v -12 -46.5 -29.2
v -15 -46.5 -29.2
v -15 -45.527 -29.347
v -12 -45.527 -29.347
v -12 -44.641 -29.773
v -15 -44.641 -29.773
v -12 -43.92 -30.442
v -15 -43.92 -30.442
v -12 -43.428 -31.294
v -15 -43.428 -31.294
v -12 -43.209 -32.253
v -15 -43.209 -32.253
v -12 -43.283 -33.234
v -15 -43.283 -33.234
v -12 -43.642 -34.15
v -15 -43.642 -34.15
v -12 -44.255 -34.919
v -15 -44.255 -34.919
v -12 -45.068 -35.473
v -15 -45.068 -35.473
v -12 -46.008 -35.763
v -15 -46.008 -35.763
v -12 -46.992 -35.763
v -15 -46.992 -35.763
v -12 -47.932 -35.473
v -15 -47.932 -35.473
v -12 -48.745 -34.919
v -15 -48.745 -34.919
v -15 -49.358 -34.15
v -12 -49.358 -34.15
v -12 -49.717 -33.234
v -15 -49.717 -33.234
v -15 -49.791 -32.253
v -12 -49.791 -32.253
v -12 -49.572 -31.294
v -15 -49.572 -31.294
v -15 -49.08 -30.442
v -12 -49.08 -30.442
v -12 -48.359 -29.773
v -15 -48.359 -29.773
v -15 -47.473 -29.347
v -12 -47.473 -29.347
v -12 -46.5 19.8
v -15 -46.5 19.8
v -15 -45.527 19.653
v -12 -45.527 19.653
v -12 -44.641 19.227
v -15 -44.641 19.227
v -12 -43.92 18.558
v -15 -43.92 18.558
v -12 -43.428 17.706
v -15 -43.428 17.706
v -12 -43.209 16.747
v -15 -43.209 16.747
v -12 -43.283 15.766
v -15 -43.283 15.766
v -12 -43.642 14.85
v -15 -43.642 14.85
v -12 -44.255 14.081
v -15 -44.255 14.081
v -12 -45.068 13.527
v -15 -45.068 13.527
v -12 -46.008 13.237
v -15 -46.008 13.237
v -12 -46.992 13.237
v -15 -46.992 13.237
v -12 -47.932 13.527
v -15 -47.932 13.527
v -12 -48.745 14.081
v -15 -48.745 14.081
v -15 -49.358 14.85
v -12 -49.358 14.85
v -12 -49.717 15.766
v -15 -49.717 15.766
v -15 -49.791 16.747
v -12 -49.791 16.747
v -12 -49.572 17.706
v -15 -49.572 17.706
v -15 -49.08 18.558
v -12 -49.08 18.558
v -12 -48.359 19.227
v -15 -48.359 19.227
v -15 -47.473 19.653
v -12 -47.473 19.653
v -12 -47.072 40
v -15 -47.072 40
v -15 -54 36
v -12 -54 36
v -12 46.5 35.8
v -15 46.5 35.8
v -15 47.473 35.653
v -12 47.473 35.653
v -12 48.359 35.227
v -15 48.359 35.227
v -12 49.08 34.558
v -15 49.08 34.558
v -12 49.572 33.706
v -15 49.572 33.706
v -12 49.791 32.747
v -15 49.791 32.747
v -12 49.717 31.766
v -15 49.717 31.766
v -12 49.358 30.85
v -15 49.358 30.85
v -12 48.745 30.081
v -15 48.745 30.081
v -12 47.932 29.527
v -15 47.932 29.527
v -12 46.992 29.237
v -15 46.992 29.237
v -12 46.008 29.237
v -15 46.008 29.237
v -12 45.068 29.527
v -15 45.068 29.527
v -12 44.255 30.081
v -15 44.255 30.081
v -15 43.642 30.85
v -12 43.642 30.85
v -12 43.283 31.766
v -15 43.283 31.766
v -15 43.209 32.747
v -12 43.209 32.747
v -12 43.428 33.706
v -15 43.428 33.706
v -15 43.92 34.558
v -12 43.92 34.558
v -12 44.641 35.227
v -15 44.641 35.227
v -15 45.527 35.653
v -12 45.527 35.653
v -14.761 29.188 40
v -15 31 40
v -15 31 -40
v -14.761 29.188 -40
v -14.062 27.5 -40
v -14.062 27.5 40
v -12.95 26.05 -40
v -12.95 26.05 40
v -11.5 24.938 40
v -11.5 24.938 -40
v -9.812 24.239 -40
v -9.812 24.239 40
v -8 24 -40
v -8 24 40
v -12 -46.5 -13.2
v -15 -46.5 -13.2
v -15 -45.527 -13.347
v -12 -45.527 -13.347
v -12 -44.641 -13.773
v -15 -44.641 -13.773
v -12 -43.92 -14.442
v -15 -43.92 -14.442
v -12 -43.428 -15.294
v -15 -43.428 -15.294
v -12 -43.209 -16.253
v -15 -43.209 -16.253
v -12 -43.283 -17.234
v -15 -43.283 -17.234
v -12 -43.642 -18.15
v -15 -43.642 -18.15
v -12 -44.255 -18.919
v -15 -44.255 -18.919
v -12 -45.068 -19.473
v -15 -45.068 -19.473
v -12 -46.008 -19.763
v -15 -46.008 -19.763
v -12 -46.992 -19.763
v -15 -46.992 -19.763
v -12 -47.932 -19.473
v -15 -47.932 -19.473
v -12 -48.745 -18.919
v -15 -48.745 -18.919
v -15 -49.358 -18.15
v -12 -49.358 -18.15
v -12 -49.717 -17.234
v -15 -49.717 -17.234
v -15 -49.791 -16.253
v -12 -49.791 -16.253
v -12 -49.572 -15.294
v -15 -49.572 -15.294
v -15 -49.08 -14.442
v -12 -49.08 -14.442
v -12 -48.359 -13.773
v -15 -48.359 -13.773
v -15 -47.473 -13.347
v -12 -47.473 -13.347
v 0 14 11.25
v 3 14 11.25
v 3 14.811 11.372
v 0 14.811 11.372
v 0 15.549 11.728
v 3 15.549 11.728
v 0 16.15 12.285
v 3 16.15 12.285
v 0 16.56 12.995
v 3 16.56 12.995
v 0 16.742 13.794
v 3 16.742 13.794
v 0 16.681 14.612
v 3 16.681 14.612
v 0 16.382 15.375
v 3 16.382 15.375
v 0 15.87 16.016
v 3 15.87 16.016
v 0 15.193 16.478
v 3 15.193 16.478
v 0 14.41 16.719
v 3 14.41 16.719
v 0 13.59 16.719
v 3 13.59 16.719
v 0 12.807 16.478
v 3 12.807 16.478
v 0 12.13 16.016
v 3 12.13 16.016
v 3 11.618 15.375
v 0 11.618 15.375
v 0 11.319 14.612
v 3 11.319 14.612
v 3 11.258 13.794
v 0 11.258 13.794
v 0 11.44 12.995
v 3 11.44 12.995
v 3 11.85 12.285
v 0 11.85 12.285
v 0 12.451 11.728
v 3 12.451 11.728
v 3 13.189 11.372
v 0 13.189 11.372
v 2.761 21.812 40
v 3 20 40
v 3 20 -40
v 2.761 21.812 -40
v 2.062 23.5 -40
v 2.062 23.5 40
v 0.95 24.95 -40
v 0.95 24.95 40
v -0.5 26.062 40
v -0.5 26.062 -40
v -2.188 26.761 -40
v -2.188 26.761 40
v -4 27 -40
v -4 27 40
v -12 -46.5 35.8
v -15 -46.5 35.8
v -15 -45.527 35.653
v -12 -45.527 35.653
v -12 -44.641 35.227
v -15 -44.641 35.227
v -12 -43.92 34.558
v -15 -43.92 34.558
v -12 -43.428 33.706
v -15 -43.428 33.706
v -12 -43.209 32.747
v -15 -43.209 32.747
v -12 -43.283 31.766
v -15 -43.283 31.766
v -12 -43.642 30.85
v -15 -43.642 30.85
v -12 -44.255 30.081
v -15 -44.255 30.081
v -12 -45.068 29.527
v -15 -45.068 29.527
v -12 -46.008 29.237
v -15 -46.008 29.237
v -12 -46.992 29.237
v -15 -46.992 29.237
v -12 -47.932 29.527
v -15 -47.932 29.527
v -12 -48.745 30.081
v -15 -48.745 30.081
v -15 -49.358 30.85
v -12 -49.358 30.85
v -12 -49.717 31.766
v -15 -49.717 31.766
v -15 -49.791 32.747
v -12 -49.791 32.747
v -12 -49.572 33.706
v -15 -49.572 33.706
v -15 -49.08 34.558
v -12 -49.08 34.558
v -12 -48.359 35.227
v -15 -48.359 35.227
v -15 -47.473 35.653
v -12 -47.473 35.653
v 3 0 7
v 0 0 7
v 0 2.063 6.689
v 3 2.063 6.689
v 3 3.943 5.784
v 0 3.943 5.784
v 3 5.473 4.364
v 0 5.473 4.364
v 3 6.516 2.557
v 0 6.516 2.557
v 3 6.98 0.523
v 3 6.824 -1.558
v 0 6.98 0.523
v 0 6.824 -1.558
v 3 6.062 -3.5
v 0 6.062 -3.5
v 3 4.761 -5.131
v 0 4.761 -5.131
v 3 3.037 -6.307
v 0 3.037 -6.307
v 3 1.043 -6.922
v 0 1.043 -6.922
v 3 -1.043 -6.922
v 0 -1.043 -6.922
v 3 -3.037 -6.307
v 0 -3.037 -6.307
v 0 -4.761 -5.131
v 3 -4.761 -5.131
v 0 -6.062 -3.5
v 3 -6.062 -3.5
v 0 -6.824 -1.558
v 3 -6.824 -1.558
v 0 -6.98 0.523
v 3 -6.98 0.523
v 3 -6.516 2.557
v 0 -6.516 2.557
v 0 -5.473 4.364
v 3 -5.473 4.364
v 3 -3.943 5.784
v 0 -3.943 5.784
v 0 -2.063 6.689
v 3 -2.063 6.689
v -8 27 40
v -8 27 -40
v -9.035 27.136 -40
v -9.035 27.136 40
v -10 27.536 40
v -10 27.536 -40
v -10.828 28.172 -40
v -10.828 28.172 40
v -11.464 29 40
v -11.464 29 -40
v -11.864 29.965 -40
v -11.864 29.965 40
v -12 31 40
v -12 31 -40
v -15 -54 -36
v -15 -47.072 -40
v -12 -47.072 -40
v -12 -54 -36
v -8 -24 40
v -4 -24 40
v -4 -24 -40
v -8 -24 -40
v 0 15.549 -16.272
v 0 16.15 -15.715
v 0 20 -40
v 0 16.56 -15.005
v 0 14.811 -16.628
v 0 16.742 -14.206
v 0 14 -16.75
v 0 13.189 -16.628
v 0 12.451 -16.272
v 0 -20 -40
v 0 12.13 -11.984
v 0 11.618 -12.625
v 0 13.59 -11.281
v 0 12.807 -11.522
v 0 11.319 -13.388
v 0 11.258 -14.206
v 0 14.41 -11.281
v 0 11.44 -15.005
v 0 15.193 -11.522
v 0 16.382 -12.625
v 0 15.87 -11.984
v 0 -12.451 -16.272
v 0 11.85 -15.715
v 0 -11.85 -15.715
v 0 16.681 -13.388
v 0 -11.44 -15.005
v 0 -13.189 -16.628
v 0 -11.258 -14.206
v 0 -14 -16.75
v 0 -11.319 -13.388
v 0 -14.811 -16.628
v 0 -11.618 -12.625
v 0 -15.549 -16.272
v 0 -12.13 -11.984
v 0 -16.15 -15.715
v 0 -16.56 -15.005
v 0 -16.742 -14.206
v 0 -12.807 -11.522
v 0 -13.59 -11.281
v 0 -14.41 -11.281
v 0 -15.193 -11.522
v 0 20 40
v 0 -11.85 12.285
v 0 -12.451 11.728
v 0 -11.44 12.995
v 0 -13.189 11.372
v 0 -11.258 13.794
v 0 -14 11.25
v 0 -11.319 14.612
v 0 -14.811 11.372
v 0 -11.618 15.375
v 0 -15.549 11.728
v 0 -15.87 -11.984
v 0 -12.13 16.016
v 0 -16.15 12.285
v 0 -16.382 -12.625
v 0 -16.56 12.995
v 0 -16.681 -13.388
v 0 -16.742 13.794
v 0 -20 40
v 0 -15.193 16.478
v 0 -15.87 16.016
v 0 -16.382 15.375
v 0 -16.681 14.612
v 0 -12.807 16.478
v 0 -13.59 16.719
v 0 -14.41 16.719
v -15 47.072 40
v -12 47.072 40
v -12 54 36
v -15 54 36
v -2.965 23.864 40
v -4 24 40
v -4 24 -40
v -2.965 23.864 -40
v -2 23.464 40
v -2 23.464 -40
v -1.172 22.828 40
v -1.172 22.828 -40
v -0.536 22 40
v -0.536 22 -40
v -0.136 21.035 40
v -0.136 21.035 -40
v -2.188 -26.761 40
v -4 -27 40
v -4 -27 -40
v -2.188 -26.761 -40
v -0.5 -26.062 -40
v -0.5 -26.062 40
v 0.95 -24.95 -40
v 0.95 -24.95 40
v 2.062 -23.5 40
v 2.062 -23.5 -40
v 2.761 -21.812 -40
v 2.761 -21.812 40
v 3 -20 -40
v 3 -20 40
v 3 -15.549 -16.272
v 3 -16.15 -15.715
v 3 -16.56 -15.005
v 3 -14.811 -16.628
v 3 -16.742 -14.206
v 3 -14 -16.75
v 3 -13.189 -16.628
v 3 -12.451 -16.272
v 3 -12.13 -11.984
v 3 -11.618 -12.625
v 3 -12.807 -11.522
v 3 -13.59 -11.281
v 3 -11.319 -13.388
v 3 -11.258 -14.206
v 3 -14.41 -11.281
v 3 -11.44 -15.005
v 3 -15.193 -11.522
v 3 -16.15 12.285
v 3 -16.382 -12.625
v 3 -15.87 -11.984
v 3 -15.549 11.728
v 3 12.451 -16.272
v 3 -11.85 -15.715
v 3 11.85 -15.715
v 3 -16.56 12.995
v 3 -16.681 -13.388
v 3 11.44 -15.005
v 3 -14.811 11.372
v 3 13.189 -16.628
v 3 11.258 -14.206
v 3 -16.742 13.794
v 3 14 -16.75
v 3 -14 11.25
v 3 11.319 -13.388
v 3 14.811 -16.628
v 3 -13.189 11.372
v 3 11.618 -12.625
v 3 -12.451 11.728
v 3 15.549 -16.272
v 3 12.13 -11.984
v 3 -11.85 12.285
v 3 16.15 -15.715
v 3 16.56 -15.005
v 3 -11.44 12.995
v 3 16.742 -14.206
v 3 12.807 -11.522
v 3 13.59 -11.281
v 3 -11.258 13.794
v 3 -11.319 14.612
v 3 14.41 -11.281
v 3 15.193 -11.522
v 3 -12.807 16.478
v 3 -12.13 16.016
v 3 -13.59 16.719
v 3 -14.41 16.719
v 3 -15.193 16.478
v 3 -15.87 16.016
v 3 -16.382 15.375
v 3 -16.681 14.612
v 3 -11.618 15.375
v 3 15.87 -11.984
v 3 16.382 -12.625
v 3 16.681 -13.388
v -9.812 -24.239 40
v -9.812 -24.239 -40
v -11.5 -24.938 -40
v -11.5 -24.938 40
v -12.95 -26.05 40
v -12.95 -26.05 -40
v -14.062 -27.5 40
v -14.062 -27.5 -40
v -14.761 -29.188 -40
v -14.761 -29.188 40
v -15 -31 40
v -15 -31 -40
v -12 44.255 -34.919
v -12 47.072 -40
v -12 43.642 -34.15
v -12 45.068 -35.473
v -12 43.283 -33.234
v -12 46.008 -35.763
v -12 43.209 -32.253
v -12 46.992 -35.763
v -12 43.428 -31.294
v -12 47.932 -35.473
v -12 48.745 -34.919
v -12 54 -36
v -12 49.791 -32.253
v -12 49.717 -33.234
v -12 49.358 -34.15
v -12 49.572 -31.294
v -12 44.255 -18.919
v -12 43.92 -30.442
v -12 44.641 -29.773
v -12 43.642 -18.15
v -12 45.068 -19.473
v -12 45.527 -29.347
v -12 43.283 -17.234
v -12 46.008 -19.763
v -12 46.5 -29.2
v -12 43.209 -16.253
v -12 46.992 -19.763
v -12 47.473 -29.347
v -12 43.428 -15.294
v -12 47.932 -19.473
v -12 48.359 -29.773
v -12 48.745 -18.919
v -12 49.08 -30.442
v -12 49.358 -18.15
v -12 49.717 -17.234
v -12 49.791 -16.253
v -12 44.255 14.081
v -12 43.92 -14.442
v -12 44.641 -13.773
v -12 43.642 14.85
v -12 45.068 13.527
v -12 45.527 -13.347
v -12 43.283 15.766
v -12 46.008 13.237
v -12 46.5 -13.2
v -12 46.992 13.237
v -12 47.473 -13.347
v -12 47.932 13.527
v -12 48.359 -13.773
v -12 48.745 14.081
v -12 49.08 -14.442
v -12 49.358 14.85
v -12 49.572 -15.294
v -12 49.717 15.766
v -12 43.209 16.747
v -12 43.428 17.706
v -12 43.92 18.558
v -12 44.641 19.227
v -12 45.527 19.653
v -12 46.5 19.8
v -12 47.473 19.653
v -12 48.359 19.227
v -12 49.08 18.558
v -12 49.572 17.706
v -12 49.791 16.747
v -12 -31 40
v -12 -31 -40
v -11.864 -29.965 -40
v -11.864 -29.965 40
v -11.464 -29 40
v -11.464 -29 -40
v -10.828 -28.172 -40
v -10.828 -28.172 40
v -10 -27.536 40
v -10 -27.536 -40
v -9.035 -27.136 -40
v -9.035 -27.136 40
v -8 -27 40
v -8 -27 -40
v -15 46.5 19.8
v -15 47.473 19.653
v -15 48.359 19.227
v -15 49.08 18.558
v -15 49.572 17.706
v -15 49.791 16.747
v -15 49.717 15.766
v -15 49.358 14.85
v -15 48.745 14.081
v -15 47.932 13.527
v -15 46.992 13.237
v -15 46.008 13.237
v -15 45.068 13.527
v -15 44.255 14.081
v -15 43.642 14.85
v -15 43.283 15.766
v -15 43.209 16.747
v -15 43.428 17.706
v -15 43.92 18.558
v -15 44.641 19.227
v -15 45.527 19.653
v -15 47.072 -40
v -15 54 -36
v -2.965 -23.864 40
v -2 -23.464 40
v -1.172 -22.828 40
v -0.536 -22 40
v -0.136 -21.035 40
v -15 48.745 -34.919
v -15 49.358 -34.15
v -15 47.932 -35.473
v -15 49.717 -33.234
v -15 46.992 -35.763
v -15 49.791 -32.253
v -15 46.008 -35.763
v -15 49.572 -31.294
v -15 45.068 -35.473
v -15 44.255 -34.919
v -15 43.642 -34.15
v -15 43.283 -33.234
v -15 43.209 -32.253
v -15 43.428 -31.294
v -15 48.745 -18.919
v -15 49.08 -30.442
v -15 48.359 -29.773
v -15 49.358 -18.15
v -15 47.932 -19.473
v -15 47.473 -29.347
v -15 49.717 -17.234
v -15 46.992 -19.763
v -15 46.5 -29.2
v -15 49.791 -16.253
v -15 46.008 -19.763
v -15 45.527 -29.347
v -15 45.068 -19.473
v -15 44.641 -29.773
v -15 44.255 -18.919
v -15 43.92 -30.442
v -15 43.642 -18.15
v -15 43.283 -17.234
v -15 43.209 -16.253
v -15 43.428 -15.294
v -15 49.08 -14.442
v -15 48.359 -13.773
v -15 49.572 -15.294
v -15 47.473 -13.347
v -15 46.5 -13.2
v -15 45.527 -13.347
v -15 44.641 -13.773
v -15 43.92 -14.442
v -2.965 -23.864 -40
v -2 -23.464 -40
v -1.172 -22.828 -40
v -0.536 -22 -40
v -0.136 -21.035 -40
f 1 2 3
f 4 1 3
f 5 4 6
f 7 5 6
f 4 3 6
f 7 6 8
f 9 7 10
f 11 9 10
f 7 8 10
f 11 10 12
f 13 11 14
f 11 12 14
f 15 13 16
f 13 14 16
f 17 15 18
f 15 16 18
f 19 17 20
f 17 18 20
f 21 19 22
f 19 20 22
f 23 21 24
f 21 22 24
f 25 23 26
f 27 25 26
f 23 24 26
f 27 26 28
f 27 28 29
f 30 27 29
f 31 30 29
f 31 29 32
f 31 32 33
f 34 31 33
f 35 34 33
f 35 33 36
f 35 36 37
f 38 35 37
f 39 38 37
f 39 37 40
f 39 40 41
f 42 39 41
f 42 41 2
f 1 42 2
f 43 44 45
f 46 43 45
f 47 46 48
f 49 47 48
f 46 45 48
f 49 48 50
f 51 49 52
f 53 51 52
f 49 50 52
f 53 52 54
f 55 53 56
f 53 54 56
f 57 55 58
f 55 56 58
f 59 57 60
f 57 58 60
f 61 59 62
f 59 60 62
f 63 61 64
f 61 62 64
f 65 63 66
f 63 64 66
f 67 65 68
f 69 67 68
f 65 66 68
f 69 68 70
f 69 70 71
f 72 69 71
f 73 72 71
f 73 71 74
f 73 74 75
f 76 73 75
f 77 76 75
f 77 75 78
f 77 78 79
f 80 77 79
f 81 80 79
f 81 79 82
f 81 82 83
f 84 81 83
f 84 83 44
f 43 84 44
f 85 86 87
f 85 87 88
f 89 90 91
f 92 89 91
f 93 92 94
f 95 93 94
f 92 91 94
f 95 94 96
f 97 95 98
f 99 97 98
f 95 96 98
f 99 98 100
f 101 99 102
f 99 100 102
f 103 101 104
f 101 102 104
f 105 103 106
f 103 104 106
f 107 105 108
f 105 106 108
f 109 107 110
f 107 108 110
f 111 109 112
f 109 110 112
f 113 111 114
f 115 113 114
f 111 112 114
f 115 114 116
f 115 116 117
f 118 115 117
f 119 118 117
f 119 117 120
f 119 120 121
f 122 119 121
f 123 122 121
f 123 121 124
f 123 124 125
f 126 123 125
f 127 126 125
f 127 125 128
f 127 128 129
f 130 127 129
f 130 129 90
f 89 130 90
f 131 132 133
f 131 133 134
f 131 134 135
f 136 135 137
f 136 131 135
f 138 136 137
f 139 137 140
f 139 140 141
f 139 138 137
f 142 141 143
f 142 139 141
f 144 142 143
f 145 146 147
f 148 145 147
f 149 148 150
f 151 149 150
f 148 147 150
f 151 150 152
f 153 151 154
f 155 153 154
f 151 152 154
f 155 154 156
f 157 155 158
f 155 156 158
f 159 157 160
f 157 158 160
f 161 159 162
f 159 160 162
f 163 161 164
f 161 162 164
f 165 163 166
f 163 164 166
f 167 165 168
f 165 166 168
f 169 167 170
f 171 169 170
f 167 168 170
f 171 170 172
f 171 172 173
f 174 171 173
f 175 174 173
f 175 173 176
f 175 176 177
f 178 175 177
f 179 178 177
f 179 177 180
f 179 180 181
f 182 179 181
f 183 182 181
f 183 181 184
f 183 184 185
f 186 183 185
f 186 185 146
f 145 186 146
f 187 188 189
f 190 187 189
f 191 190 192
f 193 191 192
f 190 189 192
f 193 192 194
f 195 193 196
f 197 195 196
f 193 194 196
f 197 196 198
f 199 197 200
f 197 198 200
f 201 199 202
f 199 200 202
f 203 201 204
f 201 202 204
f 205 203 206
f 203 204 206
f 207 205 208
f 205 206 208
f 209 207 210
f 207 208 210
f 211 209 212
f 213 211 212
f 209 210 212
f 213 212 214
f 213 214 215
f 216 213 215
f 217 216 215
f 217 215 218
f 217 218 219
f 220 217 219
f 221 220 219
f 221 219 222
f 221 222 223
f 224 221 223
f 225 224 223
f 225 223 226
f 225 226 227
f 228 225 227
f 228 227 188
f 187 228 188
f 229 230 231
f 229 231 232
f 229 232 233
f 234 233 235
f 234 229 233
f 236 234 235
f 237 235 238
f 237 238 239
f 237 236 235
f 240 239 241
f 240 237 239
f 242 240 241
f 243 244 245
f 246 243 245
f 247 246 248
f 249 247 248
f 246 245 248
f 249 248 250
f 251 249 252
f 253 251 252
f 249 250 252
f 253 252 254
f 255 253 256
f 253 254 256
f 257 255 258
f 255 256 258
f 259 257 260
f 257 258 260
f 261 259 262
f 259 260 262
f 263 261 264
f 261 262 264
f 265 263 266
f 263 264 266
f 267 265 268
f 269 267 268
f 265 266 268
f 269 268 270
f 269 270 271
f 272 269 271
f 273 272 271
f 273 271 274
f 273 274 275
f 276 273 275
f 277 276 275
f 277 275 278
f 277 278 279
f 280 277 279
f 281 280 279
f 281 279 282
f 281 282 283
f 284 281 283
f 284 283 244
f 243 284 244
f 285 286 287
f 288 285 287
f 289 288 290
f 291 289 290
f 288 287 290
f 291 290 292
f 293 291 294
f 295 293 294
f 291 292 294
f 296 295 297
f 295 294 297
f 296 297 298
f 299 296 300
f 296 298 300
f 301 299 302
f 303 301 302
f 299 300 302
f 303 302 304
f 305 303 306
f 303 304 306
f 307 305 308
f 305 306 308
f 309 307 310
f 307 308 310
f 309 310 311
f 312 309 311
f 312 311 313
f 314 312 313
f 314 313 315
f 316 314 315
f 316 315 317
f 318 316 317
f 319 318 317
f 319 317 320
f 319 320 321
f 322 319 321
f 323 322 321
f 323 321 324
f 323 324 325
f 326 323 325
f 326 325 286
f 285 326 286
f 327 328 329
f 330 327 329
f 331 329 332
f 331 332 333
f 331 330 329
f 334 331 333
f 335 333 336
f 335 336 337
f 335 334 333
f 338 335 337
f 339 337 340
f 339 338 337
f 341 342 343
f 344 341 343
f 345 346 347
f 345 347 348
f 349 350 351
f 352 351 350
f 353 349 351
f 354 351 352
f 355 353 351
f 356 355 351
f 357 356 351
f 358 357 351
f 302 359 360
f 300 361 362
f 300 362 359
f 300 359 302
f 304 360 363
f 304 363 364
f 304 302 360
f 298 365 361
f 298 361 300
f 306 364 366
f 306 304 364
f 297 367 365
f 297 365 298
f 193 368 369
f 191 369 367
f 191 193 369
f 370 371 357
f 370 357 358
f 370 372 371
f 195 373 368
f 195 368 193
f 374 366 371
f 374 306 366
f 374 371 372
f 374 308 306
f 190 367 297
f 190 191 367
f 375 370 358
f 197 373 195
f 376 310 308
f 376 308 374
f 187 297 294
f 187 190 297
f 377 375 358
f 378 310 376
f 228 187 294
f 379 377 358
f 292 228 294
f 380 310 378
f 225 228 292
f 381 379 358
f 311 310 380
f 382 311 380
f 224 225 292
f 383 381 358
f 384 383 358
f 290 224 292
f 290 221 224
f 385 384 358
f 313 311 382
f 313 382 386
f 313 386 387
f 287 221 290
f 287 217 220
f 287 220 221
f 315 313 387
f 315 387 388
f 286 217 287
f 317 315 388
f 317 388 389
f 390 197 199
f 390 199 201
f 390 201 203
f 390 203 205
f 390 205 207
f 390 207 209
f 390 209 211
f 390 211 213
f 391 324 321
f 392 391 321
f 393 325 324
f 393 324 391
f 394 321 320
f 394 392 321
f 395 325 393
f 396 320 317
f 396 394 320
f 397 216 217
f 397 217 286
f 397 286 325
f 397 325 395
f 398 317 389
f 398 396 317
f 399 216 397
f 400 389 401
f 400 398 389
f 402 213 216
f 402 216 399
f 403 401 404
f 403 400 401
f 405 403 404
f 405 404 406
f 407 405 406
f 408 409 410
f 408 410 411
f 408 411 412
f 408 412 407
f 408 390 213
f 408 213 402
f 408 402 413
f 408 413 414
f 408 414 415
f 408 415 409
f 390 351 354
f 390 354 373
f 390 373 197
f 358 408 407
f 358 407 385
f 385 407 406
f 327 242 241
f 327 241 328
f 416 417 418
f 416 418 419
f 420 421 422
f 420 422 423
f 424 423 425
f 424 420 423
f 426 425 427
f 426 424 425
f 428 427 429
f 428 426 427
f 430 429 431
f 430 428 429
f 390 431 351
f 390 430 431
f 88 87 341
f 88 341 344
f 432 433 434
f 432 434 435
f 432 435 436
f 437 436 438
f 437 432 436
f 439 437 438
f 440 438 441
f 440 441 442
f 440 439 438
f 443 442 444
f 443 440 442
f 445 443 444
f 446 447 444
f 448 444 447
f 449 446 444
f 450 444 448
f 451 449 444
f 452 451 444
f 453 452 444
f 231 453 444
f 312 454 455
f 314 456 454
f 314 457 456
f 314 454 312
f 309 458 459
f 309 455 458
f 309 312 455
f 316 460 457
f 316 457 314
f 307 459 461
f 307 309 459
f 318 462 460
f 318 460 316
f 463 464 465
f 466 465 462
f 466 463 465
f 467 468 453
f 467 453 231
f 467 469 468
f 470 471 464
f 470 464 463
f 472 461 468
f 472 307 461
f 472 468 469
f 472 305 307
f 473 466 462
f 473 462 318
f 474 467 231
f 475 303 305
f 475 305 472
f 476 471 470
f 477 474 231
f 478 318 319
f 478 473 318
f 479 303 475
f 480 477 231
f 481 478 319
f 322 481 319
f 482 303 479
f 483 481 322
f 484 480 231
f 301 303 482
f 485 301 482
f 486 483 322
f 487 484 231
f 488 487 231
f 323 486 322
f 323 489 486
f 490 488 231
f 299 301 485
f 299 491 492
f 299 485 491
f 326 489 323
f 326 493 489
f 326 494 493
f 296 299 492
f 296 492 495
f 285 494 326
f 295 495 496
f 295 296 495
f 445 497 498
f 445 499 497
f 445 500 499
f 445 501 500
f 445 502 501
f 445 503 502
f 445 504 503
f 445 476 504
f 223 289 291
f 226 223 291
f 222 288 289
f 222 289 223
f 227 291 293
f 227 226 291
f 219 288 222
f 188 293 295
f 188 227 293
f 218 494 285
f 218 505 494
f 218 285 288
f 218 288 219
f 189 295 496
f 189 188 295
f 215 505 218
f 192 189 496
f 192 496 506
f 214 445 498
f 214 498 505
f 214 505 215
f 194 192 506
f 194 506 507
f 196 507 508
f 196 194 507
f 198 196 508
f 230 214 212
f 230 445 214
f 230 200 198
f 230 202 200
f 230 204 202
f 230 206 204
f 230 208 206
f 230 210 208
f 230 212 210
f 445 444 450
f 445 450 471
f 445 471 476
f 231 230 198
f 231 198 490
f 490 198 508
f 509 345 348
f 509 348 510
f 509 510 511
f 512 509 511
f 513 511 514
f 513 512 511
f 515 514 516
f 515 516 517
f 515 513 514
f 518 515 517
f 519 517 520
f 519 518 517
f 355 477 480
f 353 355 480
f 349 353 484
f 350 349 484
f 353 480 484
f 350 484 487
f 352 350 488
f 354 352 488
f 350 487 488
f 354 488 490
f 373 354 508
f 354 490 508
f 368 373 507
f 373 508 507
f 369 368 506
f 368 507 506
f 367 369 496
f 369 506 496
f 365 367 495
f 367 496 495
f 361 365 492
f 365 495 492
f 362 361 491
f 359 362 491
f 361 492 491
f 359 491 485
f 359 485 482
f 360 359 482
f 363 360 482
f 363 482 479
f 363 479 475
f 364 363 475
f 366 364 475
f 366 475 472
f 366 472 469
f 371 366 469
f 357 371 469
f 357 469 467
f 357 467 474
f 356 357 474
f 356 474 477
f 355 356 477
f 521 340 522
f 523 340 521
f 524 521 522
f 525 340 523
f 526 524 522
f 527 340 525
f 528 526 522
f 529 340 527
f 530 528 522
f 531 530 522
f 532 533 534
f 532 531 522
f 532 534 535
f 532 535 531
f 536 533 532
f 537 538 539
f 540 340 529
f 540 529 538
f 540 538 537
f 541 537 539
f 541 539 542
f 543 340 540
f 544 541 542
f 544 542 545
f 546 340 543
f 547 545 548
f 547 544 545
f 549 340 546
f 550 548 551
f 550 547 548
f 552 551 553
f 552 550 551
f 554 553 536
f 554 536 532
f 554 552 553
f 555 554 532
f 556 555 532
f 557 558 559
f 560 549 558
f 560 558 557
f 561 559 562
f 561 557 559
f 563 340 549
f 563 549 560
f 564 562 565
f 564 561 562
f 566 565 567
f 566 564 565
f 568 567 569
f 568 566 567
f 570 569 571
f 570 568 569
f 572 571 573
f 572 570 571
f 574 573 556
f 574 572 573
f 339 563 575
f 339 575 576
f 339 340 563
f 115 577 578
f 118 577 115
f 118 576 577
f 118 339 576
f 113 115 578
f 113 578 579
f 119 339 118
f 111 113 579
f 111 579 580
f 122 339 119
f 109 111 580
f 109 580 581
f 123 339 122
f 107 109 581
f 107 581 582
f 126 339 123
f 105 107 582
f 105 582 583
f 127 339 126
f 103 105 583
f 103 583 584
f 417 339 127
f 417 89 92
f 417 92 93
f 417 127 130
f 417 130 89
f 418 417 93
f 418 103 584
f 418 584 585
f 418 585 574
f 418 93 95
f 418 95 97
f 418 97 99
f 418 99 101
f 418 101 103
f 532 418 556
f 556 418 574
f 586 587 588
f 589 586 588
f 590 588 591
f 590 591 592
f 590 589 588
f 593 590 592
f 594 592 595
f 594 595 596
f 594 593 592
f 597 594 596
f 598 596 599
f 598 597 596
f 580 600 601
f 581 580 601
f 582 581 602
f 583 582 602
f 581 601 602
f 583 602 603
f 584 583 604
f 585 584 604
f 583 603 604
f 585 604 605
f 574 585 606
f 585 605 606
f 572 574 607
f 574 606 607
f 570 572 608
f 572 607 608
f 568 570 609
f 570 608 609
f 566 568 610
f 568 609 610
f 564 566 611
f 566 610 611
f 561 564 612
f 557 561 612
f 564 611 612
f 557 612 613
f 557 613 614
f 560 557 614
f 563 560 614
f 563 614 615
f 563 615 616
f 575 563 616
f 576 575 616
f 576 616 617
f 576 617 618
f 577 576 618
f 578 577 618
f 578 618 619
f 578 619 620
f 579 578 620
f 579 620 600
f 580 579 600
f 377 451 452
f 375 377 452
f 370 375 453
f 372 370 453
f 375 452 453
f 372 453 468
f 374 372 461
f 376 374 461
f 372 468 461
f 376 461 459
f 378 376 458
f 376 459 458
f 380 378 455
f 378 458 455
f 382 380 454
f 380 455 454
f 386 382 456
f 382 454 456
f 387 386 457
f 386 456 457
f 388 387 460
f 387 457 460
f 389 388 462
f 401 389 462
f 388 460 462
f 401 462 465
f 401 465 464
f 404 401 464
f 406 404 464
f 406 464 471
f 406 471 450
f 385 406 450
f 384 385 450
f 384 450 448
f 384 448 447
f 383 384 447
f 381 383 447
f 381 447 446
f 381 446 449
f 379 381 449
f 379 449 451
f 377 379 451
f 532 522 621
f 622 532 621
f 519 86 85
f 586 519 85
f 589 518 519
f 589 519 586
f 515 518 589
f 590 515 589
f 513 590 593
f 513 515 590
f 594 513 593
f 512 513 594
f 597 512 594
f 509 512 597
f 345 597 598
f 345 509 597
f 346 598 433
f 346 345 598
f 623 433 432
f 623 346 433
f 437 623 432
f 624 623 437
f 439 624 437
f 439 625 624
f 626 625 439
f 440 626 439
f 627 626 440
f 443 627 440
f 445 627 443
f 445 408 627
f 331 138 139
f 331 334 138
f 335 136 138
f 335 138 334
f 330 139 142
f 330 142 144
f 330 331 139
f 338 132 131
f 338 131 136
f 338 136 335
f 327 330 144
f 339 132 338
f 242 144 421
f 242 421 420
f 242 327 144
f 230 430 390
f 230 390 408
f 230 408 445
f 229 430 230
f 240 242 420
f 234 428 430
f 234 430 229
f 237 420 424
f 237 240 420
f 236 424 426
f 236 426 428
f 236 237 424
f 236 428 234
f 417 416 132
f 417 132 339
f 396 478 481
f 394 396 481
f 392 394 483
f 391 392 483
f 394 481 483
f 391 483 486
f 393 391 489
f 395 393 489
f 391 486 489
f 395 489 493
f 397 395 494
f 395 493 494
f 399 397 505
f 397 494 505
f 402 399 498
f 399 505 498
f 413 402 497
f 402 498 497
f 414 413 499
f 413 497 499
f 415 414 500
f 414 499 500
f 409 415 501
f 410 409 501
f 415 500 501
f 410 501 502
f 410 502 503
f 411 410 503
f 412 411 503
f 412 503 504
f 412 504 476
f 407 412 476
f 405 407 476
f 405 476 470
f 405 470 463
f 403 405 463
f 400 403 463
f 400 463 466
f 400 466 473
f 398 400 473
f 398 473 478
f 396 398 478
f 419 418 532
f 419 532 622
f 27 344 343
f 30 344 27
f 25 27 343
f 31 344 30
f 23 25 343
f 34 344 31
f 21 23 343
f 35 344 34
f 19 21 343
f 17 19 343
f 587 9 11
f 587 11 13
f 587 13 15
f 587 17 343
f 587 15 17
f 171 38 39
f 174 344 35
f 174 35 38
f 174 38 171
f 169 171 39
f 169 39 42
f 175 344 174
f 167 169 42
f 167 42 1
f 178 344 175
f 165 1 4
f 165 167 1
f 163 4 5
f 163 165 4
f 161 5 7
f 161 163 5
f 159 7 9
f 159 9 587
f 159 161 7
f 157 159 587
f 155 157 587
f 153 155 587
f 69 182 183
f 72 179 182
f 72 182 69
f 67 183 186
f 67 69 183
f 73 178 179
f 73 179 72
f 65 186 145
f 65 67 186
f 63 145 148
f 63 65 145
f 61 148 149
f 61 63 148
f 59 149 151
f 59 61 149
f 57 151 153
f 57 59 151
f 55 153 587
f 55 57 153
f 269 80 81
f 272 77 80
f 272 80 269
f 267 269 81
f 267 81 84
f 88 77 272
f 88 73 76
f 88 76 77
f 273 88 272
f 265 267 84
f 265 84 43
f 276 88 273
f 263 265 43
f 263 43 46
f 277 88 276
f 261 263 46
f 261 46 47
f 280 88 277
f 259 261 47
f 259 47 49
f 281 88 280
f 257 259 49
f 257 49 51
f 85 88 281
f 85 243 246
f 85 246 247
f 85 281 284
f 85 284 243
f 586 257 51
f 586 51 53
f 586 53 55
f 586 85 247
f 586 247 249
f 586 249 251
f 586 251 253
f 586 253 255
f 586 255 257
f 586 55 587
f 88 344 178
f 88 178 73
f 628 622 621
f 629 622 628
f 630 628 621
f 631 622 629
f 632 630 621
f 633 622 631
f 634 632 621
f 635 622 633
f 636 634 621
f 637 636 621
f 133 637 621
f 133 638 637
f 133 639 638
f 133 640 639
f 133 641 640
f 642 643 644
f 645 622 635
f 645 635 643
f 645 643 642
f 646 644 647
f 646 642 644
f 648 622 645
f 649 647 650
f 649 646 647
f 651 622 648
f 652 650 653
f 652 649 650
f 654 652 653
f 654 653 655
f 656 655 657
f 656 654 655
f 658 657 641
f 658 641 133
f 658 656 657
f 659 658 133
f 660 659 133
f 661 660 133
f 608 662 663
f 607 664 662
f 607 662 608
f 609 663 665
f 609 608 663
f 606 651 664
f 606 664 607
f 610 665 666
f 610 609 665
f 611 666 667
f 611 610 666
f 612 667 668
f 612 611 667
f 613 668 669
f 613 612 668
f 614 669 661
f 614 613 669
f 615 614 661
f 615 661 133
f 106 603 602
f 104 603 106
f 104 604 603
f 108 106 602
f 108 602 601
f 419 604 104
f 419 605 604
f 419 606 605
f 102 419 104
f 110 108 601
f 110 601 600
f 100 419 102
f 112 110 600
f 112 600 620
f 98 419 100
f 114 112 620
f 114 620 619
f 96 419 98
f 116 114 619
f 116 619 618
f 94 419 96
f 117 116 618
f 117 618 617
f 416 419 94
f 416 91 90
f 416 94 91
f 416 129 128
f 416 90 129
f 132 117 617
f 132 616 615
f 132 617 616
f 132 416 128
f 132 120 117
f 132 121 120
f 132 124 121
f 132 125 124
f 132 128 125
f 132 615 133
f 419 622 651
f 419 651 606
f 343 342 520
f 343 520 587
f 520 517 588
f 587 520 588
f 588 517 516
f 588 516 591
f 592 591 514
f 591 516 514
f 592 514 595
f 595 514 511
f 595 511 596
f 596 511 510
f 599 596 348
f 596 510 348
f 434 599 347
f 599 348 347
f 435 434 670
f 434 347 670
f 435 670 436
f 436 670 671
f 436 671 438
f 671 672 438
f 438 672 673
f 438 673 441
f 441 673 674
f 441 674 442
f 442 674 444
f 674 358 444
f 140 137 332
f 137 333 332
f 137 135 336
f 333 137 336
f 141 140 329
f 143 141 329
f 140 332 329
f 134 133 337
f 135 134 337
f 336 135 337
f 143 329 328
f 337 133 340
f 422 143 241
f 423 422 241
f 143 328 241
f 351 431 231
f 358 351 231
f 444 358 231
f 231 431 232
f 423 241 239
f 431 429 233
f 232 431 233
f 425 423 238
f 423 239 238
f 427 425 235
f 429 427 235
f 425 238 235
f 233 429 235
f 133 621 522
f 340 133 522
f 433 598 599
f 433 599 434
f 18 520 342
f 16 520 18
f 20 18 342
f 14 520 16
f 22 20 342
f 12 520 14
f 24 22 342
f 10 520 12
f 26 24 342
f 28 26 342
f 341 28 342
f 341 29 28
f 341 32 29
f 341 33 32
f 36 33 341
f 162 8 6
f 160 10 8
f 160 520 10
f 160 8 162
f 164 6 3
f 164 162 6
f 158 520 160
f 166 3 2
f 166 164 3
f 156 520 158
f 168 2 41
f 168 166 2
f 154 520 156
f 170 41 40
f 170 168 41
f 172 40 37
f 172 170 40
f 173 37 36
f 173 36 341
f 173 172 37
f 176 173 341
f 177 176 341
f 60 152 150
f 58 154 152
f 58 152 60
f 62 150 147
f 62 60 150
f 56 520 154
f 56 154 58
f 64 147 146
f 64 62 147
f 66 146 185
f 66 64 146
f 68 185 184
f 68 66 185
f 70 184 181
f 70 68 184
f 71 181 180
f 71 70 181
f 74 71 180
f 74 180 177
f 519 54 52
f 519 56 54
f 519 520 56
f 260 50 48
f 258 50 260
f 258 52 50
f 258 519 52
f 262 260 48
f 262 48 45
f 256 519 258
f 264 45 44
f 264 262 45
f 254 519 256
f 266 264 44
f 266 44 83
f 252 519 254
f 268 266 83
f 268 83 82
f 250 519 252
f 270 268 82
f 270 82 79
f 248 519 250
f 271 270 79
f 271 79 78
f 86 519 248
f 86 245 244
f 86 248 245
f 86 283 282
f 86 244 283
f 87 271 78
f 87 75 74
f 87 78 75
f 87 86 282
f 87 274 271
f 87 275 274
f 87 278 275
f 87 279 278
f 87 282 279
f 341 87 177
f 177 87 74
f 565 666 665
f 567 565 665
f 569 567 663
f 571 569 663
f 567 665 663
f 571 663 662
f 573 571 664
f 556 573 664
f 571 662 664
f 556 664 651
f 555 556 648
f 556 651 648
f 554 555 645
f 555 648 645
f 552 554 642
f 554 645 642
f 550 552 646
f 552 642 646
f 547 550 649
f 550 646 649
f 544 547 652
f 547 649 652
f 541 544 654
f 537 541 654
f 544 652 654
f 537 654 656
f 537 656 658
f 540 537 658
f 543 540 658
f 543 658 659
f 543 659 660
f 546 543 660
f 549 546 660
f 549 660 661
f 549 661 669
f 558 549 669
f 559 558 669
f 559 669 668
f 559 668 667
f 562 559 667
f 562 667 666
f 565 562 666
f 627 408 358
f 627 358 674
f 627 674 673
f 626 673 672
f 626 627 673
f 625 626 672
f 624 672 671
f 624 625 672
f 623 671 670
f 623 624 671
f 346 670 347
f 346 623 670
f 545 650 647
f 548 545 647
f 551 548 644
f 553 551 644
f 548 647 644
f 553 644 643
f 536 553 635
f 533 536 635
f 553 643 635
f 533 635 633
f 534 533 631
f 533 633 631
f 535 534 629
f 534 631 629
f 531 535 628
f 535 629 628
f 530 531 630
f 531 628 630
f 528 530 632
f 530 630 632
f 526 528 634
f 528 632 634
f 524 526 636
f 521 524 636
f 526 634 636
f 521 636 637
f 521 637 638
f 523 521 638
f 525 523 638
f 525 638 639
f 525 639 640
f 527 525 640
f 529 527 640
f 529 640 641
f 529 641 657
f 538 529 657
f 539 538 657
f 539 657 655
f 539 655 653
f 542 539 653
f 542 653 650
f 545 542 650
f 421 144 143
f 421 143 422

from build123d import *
from OCP.BRepFilletAPI import BRepFilletAPI_MakeChamfer

# Parameters (mm, degrees)
ODGI_CIE_BAZOWE1_DEPTH     = 40
OTW_R_POD_RUB_M51_D        = 5.5
SZKIC4_R                   = 7
WYTNIJ_WYCI_GNI_CIE1_DEPTH = 69.85491994
OTW_R_POD_RUB_M61_D        = 6.6
SFAZOWANIE1_SIZE           = 4
SFAZOWANIE1_SIZE2          = 6.92820323


# Sheet-metal steps are written as plain solids
with BuildPart() as part:
    # Szkic1 → Odgięcie bazowe1 (new, symmetric)
    with BuildSketch(Plane.XY):
        with BuildLine():
            Line((-15, 54), (-15, 31))
            ThreePointArc((-15, 31), (-12.949747468, 26.050252532), (-8, 24))
            Line((-8, 24), (-4, 24))
            ThreePointArc((-4, 24), (-1.171572875, 22.828427125), (0, 20))
            Line((0, 20), (0, -20))
            ThreePointArc((0, -20), (-1.171572875, -22.828427125), (-4, -24))
            Line((-4, -24), (-8, -24))
            ThreePointArc((-8, -24), (-12.949747468, -26.050252532), (-15, -31))
            Line((-15, -31), (-15, -54))
            Line((-15, -54), (-12, -54))
            Line((-12, -54), (-12, -31))
            ThreePointArc((-12, -31), (-10.828427125, -28.171572875), (-8, -27))
            Line((-8, -27), (-4, -27))
            ThreePointArc((-4, -27), (0.949747468, -24.949747468), (3, -20))
            Line((3, -20), (3, 20))
            ThreePointArc((3, 20), (0.949747468, 24.949747468), (-4, 27))
            Line((-4, 27), (-8, 27))
            ThreePointArc((-8, 27), (-10.828427125, 28.171572875), (-12, 31))
            Line((-12, 31), (-12, 54))
            Line((-12, 54), (-15, 54))
        make_face()
    extrude(amount=ODGI_CIE_BAZOWE1_DEPTH, both=True)

    # Otwór pod śrubę M51 (through all)
    with Locations(Plane.ZY):
        with Locations((-14, 14), (14, 14), (14, -14), (-14, -14)):
            Hole(OTW_R_POD_RUB_M51_D / 2)

    # Szkic4 → Wytnij-wyciągnięcie1 (cut, through all)
    with BuildSketch(Plane.ZY):
        Circle(SZKIC4_R)
    extrude(amount=-WYTNIJ_WYCI_GNI_CIE1_DEPTH, mode=Mode.SUBTRACT)

    # Otwór pod śrubę M61 (through all)
    with Locations(Plane(origin=(-12, 0, 0), x_dir=(0, 0, -1), z_dir=(1, 0, 0))):
        with Locations((-32.50000905, 46.5), (-16.50000905, 46.5), (16.5, 46.5), (32.5, 46.5), (32.5, -46.5), (16.5, -46.5), (-16.49999095, -46.5), (-32.49999095, -46.5)):
            Hole(OTW_R_POD_RUB_M61_D / 2)

    # Sfazowanie1: one chamfer whose edges measure the first distance from different faces: ONE call of the kernel's chamfer builder (chamfer() names one face for all edges)
    sfazowanie1_edges_1 = [part.edges().sort_by_distance(p)[0] for p in [
        (-13.5, -54, -40),
        (-13.5, -54, 40),
    ]]
    sfazowanie1_side_1 = [part.faces().sort_by_distance(p)[0] for p in [
        (-13.5, -54, 0),
    ]]
    sfazowanie1_edges_2 = [part.edges().sort_by_distance(p)[0] for p in [
        (-13.5, 54, -40),
        (-13.5, 54, 40),
    ]]
    sfazowanie1_side_2 = [part.faces().sort_by_distance(p)[0] for p in [
        (-13.5, 54, 0),
    ]]
    sfazowanie1 = BRepFilletAPI_MakeChamfer(part.part.solid().wrapped)
    for e in sfazowanie1_edges_1:
        sfazowanie1.Add(SFAZOWANIE1_SIZE, SFAZOWANIE1_SIZE2, e.wrapped, sfazowanie1_side_1[0].wrapped)  # the first distance lies on this face
    for e in sfazowanie1_edges_2:
        sfazowanie1.Add(SFAZOWANIE1_SIZE, SFAZOWANIE1_SIZE2, e.wrapped, sfazowanie1_side_2[0].wrapped)  # the first distance lies on this face
    add(Compound.cast(sfazowanie1.Shape()), mode=Mode.REPLACE)


solid = part.part
